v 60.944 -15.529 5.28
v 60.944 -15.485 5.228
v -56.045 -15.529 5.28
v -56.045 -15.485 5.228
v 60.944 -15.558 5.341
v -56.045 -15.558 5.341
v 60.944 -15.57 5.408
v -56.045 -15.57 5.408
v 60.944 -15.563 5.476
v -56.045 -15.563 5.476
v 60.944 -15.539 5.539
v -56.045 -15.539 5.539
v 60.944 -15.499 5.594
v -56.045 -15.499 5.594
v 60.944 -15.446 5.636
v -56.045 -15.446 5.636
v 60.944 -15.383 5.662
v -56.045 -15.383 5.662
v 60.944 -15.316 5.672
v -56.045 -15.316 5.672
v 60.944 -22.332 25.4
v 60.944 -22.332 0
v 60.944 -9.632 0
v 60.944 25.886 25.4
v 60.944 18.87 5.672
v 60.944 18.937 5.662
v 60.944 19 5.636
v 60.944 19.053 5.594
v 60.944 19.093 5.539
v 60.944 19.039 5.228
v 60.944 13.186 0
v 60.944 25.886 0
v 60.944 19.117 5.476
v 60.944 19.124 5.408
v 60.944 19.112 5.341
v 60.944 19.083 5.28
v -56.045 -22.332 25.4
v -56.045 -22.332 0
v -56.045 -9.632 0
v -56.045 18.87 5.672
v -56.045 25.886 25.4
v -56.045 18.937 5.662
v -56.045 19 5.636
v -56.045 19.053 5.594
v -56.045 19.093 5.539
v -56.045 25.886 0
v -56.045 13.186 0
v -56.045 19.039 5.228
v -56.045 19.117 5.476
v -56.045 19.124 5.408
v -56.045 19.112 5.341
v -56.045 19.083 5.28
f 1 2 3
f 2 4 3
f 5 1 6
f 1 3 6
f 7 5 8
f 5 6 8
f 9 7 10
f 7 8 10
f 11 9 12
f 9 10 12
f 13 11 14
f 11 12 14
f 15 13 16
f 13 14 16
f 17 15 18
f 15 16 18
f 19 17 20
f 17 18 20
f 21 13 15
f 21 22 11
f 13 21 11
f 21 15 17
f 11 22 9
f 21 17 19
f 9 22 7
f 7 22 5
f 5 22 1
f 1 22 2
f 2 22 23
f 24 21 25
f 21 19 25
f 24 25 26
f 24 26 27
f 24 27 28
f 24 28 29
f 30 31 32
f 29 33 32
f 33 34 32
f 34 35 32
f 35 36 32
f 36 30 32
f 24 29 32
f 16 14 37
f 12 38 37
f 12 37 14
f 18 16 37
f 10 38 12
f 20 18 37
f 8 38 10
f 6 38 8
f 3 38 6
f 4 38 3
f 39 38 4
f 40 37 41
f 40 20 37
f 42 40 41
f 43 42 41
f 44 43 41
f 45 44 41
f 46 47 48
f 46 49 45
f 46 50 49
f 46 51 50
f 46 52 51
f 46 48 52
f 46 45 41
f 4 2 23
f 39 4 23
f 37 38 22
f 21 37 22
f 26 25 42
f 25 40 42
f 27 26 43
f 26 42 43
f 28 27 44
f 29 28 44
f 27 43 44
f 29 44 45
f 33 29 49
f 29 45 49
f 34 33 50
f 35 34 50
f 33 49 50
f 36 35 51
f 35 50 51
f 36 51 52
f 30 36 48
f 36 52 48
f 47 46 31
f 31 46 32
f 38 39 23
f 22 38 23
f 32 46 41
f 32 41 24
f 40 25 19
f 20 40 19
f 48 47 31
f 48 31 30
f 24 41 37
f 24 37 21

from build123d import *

# Parameters (mm, degrees)
F0_W     = 116.989415
F0_H     = 48.217313
F1_DEPTH = 25.4
F3_DEPTH = 116.990415
F4_R     = 0.254


with BuildPart() as f1:
    # F0 (on Top) → F1 (new body)
    with BuildSketch(Plane.XY):
        with Locations((2.449287, 1.776933)):
            Rectangle(F0_W, F0_H)
    extrude(amount=F1_DEPTH)

    # F2 (on face) → F3 (cut, through all)
    with BuildSketch(Plane.YZ.offset(60.943995)):
        Polygon((-15.981724, 5.67151), (-9.631724, 0), (13.185589, 0), (19.535589, 5.67151), align=None)
    extrude(amount=-F3_DEPTH, mode=Mode.SUBTRACT)

    # F4
    f4_edges = [f1.edges().sort_by_distance(p)[0] for p in [
        (2.449287, -15.981724, 5.67151),
        (2.449287, 19.535589, 5.67151),
    ]]
    fillet(f4_edges, radius=F4_R)


solid = f1.part
